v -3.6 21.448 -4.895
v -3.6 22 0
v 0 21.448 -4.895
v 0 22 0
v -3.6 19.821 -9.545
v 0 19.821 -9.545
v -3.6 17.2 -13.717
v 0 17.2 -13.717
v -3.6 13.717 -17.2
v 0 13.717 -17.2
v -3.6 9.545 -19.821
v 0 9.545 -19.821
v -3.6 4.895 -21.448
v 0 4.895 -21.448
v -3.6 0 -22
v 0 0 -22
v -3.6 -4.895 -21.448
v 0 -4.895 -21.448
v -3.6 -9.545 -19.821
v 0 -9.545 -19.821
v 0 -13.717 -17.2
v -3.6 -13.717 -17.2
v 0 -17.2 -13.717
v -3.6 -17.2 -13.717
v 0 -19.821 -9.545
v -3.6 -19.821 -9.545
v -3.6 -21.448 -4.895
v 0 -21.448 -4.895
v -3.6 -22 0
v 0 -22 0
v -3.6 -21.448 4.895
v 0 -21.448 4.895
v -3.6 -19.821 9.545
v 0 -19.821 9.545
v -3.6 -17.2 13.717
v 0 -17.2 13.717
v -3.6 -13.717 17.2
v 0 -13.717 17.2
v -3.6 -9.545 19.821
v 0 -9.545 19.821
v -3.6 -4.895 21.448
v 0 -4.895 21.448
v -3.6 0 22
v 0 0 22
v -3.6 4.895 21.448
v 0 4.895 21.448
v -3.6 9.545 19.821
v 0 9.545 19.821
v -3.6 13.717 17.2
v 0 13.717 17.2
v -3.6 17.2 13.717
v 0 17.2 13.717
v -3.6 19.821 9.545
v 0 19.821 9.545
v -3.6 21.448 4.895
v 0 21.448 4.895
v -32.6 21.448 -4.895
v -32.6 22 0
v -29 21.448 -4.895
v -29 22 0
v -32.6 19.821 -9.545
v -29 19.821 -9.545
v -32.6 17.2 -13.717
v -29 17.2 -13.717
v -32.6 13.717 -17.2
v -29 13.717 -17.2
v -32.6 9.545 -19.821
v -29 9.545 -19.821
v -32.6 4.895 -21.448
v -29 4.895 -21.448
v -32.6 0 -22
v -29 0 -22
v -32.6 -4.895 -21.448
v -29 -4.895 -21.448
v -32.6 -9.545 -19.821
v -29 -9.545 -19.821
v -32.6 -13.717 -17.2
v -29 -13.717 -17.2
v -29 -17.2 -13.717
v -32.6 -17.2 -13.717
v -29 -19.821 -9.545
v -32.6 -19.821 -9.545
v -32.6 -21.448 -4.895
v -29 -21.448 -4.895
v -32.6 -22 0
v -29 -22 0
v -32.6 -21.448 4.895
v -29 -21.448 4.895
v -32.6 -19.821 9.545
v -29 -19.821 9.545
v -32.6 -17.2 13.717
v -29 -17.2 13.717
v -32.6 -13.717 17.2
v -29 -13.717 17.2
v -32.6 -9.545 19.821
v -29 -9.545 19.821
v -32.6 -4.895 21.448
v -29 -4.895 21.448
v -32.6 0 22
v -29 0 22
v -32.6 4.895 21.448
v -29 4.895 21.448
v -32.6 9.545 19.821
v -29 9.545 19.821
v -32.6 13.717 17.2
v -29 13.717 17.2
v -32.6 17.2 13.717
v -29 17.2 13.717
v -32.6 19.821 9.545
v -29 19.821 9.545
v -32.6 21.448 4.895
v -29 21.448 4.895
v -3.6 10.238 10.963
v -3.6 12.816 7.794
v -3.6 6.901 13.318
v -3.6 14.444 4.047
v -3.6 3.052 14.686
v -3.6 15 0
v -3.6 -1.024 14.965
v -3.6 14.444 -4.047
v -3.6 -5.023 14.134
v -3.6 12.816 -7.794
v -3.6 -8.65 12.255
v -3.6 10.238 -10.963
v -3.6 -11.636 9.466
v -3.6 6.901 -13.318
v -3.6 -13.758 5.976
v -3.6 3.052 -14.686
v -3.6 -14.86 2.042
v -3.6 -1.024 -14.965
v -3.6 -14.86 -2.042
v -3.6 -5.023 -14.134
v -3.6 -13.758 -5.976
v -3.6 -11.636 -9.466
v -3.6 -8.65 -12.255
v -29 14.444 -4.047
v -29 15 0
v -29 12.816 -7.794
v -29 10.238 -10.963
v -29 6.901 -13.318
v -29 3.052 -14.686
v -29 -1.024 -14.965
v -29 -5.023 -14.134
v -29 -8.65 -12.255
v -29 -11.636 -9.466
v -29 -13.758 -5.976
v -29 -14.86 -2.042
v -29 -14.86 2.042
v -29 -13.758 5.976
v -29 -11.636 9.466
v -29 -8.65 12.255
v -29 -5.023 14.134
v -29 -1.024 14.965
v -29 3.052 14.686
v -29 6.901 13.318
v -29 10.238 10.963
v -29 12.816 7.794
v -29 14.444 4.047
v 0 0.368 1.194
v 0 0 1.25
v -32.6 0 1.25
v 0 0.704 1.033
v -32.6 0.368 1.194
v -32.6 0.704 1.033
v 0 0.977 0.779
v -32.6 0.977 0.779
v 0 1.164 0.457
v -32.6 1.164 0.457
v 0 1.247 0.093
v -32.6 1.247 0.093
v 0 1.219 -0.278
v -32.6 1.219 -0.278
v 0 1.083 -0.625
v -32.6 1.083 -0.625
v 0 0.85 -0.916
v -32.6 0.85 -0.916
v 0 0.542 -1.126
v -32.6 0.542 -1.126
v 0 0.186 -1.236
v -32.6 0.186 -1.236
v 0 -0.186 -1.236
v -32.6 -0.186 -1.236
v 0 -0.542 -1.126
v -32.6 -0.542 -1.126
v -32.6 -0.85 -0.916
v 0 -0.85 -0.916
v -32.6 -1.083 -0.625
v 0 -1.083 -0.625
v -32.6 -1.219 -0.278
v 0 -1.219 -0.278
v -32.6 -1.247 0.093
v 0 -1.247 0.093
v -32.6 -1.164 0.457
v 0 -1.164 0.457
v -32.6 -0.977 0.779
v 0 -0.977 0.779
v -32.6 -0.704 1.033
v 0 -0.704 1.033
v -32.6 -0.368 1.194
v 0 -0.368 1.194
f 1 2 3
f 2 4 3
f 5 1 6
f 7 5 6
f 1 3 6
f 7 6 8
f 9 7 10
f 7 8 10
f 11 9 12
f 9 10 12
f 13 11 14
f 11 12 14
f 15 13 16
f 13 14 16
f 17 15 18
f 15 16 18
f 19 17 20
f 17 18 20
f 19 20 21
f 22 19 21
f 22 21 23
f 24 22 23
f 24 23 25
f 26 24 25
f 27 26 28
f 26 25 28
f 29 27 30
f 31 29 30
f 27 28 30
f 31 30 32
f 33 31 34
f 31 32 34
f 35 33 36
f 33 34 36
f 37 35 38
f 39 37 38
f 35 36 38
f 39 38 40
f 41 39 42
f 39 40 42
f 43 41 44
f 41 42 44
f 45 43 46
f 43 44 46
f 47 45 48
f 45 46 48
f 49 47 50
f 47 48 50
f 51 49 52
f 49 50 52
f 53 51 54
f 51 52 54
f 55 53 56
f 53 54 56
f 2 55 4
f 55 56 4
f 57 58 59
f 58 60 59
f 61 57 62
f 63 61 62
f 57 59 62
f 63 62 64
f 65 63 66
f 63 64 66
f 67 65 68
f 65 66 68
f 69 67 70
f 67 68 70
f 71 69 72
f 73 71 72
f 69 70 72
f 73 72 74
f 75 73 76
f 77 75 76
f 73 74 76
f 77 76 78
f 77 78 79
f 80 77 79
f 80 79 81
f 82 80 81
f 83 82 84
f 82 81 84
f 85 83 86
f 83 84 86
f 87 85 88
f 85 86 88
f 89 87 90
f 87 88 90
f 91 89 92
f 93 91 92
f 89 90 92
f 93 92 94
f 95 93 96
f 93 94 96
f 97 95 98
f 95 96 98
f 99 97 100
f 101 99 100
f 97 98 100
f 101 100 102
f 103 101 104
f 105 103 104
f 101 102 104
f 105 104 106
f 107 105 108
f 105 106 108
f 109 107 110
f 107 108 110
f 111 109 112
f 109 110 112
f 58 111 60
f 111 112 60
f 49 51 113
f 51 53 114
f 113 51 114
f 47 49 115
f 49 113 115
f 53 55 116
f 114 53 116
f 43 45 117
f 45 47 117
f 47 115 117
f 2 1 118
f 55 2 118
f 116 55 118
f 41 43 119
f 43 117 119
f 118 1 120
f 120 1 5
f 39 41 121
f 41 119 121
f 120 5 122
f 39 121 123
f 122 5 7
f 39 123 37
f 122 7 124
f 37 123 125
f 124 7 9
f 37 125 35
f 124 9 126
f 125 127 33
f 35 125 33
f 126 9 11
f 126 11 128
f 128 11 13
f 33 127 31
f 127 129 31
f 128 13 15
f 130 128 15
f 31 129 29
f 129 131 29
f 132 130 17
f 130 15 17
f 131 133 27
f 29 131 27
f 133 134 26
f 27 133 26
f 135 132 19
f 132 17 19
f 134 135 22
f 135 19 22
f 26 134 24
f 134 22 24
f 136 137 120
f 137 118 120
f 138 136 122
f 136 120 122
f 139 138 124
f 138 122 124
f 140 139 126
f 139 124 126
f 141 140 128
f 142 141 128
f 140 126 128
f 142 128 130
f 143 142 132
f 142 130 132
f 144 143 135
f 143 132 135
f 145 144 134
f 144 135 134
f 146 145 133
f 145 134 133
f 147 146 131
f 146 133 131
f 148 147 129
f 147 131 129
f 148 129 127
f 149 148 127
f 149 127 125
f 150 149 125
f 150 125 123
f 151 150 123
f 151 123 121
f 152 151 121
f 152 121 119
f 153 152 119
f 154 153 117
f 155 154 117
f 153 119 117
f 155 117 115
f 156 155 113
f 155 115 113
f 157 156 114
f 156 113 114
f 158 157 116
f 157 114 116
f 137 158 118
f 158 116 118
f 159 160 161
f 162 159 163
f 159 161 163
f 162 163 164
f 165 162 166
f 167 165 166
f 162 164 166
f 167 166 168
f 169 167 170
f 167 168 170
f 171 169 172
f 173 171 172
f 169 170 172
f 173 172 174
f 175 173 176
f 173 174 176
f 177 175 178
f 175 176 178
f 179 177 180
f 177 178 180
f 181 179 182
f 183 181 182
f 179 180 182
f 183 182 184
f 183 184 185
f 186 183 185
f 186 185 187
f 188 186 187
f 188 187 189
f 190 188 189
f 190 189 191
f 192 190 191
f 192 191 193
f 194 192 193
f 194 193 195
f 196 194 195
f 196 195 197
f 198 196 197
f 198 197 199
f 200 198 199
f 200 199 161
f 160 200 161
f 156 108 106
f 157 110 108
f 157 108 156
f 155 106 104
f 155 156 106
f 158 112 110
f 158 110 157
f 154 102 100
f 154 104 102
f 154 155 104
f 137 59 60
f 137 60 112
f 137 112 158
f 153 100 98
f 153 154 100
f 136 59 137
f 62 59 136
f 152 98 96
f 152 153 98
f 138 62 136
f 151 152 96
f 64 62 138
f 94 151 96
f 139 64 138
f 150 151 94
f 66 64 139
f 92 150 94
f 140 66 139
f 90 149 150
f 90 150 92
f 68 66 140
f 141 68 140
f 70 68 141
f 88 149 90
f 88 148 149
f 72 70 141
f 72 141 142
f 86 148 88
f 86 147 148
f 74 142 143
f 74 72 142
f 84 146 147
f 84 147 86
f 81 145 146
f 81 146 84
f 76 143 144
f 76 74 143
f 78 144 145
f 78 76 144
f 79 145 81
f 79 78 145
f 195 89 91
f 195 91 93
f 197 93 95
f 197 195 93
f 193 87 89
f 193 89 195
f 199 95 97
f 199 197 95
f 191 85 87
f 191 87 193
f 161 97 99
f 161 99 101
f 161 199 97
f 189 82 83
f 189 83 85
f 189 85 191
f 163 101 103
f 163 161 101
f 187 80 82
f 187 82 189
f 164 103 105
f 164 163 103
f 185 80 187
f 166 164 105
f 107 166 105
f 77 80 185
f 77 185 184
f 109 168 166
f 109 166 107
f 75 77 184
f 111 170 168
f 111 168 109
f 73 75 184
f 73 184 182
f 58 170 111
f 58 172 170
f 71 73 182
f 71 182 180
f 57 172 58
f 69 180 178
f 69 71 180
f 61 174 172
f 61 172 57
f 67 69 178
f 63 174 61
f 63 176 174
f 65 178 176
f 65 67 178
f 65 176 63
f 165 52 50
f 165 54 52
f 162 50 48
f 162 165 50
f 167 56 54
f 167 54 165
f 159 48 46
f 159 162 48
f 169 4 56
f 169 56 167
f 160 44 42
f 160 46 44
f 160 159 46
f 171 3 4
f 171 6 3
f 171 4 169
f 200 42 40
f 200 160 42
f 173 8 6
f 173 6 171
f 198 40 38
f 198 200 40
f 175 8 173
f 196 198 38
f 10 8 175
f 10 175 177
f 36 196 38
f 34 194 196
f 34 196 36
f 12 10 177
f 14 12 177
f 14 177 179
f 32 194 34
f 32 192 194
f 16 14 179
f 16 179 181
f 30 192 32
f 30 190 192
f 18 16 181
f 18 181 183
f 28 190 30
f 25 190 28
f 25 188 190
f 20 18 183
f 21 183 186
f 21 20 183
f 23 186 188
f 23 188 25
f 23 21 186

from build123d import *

# Parameters (mm, degrees)
SKETCH1_W          = 32.6
SKETCH1_H          = 15
SKETCH1_W_2        = 3.6
SKETCH1_H_2        = 7
SKETCH2_R          = 1.25
CUT_EXTRUDE1_DEPTH = 33.6


with BuildPart() as part:
    # Sketch1 → Revolve1 (revolve)
    with BuildSketch(Plane.XY):
        with Locations((-16.3, 7.5)):
            Rectangle(SKETCH1_W, SKETCH1_H)
        with Locations((-30.8, 18.5)):
            Rectangle(SKETCH1_W_2, SKETCH1_H_2)
        with Locations((-1.8, 18.5)):
            Rectangle(SKETCH1_W_2, SKETCH1_H_2)
    revolve(axis=Axis((0, 0, 0), (-1, 0, 0)))

    # Sketch2 → Cut-Extrude1 (cut, through all)
    with BuildSketch(Plane.ZY.offset(32.6)):
        Circle(SKETCH2_R)
    extrude(amount=-CUT_EXTRUDE1_DEPTH, mode=Mode.SUBTRACT)


solid = part.part
